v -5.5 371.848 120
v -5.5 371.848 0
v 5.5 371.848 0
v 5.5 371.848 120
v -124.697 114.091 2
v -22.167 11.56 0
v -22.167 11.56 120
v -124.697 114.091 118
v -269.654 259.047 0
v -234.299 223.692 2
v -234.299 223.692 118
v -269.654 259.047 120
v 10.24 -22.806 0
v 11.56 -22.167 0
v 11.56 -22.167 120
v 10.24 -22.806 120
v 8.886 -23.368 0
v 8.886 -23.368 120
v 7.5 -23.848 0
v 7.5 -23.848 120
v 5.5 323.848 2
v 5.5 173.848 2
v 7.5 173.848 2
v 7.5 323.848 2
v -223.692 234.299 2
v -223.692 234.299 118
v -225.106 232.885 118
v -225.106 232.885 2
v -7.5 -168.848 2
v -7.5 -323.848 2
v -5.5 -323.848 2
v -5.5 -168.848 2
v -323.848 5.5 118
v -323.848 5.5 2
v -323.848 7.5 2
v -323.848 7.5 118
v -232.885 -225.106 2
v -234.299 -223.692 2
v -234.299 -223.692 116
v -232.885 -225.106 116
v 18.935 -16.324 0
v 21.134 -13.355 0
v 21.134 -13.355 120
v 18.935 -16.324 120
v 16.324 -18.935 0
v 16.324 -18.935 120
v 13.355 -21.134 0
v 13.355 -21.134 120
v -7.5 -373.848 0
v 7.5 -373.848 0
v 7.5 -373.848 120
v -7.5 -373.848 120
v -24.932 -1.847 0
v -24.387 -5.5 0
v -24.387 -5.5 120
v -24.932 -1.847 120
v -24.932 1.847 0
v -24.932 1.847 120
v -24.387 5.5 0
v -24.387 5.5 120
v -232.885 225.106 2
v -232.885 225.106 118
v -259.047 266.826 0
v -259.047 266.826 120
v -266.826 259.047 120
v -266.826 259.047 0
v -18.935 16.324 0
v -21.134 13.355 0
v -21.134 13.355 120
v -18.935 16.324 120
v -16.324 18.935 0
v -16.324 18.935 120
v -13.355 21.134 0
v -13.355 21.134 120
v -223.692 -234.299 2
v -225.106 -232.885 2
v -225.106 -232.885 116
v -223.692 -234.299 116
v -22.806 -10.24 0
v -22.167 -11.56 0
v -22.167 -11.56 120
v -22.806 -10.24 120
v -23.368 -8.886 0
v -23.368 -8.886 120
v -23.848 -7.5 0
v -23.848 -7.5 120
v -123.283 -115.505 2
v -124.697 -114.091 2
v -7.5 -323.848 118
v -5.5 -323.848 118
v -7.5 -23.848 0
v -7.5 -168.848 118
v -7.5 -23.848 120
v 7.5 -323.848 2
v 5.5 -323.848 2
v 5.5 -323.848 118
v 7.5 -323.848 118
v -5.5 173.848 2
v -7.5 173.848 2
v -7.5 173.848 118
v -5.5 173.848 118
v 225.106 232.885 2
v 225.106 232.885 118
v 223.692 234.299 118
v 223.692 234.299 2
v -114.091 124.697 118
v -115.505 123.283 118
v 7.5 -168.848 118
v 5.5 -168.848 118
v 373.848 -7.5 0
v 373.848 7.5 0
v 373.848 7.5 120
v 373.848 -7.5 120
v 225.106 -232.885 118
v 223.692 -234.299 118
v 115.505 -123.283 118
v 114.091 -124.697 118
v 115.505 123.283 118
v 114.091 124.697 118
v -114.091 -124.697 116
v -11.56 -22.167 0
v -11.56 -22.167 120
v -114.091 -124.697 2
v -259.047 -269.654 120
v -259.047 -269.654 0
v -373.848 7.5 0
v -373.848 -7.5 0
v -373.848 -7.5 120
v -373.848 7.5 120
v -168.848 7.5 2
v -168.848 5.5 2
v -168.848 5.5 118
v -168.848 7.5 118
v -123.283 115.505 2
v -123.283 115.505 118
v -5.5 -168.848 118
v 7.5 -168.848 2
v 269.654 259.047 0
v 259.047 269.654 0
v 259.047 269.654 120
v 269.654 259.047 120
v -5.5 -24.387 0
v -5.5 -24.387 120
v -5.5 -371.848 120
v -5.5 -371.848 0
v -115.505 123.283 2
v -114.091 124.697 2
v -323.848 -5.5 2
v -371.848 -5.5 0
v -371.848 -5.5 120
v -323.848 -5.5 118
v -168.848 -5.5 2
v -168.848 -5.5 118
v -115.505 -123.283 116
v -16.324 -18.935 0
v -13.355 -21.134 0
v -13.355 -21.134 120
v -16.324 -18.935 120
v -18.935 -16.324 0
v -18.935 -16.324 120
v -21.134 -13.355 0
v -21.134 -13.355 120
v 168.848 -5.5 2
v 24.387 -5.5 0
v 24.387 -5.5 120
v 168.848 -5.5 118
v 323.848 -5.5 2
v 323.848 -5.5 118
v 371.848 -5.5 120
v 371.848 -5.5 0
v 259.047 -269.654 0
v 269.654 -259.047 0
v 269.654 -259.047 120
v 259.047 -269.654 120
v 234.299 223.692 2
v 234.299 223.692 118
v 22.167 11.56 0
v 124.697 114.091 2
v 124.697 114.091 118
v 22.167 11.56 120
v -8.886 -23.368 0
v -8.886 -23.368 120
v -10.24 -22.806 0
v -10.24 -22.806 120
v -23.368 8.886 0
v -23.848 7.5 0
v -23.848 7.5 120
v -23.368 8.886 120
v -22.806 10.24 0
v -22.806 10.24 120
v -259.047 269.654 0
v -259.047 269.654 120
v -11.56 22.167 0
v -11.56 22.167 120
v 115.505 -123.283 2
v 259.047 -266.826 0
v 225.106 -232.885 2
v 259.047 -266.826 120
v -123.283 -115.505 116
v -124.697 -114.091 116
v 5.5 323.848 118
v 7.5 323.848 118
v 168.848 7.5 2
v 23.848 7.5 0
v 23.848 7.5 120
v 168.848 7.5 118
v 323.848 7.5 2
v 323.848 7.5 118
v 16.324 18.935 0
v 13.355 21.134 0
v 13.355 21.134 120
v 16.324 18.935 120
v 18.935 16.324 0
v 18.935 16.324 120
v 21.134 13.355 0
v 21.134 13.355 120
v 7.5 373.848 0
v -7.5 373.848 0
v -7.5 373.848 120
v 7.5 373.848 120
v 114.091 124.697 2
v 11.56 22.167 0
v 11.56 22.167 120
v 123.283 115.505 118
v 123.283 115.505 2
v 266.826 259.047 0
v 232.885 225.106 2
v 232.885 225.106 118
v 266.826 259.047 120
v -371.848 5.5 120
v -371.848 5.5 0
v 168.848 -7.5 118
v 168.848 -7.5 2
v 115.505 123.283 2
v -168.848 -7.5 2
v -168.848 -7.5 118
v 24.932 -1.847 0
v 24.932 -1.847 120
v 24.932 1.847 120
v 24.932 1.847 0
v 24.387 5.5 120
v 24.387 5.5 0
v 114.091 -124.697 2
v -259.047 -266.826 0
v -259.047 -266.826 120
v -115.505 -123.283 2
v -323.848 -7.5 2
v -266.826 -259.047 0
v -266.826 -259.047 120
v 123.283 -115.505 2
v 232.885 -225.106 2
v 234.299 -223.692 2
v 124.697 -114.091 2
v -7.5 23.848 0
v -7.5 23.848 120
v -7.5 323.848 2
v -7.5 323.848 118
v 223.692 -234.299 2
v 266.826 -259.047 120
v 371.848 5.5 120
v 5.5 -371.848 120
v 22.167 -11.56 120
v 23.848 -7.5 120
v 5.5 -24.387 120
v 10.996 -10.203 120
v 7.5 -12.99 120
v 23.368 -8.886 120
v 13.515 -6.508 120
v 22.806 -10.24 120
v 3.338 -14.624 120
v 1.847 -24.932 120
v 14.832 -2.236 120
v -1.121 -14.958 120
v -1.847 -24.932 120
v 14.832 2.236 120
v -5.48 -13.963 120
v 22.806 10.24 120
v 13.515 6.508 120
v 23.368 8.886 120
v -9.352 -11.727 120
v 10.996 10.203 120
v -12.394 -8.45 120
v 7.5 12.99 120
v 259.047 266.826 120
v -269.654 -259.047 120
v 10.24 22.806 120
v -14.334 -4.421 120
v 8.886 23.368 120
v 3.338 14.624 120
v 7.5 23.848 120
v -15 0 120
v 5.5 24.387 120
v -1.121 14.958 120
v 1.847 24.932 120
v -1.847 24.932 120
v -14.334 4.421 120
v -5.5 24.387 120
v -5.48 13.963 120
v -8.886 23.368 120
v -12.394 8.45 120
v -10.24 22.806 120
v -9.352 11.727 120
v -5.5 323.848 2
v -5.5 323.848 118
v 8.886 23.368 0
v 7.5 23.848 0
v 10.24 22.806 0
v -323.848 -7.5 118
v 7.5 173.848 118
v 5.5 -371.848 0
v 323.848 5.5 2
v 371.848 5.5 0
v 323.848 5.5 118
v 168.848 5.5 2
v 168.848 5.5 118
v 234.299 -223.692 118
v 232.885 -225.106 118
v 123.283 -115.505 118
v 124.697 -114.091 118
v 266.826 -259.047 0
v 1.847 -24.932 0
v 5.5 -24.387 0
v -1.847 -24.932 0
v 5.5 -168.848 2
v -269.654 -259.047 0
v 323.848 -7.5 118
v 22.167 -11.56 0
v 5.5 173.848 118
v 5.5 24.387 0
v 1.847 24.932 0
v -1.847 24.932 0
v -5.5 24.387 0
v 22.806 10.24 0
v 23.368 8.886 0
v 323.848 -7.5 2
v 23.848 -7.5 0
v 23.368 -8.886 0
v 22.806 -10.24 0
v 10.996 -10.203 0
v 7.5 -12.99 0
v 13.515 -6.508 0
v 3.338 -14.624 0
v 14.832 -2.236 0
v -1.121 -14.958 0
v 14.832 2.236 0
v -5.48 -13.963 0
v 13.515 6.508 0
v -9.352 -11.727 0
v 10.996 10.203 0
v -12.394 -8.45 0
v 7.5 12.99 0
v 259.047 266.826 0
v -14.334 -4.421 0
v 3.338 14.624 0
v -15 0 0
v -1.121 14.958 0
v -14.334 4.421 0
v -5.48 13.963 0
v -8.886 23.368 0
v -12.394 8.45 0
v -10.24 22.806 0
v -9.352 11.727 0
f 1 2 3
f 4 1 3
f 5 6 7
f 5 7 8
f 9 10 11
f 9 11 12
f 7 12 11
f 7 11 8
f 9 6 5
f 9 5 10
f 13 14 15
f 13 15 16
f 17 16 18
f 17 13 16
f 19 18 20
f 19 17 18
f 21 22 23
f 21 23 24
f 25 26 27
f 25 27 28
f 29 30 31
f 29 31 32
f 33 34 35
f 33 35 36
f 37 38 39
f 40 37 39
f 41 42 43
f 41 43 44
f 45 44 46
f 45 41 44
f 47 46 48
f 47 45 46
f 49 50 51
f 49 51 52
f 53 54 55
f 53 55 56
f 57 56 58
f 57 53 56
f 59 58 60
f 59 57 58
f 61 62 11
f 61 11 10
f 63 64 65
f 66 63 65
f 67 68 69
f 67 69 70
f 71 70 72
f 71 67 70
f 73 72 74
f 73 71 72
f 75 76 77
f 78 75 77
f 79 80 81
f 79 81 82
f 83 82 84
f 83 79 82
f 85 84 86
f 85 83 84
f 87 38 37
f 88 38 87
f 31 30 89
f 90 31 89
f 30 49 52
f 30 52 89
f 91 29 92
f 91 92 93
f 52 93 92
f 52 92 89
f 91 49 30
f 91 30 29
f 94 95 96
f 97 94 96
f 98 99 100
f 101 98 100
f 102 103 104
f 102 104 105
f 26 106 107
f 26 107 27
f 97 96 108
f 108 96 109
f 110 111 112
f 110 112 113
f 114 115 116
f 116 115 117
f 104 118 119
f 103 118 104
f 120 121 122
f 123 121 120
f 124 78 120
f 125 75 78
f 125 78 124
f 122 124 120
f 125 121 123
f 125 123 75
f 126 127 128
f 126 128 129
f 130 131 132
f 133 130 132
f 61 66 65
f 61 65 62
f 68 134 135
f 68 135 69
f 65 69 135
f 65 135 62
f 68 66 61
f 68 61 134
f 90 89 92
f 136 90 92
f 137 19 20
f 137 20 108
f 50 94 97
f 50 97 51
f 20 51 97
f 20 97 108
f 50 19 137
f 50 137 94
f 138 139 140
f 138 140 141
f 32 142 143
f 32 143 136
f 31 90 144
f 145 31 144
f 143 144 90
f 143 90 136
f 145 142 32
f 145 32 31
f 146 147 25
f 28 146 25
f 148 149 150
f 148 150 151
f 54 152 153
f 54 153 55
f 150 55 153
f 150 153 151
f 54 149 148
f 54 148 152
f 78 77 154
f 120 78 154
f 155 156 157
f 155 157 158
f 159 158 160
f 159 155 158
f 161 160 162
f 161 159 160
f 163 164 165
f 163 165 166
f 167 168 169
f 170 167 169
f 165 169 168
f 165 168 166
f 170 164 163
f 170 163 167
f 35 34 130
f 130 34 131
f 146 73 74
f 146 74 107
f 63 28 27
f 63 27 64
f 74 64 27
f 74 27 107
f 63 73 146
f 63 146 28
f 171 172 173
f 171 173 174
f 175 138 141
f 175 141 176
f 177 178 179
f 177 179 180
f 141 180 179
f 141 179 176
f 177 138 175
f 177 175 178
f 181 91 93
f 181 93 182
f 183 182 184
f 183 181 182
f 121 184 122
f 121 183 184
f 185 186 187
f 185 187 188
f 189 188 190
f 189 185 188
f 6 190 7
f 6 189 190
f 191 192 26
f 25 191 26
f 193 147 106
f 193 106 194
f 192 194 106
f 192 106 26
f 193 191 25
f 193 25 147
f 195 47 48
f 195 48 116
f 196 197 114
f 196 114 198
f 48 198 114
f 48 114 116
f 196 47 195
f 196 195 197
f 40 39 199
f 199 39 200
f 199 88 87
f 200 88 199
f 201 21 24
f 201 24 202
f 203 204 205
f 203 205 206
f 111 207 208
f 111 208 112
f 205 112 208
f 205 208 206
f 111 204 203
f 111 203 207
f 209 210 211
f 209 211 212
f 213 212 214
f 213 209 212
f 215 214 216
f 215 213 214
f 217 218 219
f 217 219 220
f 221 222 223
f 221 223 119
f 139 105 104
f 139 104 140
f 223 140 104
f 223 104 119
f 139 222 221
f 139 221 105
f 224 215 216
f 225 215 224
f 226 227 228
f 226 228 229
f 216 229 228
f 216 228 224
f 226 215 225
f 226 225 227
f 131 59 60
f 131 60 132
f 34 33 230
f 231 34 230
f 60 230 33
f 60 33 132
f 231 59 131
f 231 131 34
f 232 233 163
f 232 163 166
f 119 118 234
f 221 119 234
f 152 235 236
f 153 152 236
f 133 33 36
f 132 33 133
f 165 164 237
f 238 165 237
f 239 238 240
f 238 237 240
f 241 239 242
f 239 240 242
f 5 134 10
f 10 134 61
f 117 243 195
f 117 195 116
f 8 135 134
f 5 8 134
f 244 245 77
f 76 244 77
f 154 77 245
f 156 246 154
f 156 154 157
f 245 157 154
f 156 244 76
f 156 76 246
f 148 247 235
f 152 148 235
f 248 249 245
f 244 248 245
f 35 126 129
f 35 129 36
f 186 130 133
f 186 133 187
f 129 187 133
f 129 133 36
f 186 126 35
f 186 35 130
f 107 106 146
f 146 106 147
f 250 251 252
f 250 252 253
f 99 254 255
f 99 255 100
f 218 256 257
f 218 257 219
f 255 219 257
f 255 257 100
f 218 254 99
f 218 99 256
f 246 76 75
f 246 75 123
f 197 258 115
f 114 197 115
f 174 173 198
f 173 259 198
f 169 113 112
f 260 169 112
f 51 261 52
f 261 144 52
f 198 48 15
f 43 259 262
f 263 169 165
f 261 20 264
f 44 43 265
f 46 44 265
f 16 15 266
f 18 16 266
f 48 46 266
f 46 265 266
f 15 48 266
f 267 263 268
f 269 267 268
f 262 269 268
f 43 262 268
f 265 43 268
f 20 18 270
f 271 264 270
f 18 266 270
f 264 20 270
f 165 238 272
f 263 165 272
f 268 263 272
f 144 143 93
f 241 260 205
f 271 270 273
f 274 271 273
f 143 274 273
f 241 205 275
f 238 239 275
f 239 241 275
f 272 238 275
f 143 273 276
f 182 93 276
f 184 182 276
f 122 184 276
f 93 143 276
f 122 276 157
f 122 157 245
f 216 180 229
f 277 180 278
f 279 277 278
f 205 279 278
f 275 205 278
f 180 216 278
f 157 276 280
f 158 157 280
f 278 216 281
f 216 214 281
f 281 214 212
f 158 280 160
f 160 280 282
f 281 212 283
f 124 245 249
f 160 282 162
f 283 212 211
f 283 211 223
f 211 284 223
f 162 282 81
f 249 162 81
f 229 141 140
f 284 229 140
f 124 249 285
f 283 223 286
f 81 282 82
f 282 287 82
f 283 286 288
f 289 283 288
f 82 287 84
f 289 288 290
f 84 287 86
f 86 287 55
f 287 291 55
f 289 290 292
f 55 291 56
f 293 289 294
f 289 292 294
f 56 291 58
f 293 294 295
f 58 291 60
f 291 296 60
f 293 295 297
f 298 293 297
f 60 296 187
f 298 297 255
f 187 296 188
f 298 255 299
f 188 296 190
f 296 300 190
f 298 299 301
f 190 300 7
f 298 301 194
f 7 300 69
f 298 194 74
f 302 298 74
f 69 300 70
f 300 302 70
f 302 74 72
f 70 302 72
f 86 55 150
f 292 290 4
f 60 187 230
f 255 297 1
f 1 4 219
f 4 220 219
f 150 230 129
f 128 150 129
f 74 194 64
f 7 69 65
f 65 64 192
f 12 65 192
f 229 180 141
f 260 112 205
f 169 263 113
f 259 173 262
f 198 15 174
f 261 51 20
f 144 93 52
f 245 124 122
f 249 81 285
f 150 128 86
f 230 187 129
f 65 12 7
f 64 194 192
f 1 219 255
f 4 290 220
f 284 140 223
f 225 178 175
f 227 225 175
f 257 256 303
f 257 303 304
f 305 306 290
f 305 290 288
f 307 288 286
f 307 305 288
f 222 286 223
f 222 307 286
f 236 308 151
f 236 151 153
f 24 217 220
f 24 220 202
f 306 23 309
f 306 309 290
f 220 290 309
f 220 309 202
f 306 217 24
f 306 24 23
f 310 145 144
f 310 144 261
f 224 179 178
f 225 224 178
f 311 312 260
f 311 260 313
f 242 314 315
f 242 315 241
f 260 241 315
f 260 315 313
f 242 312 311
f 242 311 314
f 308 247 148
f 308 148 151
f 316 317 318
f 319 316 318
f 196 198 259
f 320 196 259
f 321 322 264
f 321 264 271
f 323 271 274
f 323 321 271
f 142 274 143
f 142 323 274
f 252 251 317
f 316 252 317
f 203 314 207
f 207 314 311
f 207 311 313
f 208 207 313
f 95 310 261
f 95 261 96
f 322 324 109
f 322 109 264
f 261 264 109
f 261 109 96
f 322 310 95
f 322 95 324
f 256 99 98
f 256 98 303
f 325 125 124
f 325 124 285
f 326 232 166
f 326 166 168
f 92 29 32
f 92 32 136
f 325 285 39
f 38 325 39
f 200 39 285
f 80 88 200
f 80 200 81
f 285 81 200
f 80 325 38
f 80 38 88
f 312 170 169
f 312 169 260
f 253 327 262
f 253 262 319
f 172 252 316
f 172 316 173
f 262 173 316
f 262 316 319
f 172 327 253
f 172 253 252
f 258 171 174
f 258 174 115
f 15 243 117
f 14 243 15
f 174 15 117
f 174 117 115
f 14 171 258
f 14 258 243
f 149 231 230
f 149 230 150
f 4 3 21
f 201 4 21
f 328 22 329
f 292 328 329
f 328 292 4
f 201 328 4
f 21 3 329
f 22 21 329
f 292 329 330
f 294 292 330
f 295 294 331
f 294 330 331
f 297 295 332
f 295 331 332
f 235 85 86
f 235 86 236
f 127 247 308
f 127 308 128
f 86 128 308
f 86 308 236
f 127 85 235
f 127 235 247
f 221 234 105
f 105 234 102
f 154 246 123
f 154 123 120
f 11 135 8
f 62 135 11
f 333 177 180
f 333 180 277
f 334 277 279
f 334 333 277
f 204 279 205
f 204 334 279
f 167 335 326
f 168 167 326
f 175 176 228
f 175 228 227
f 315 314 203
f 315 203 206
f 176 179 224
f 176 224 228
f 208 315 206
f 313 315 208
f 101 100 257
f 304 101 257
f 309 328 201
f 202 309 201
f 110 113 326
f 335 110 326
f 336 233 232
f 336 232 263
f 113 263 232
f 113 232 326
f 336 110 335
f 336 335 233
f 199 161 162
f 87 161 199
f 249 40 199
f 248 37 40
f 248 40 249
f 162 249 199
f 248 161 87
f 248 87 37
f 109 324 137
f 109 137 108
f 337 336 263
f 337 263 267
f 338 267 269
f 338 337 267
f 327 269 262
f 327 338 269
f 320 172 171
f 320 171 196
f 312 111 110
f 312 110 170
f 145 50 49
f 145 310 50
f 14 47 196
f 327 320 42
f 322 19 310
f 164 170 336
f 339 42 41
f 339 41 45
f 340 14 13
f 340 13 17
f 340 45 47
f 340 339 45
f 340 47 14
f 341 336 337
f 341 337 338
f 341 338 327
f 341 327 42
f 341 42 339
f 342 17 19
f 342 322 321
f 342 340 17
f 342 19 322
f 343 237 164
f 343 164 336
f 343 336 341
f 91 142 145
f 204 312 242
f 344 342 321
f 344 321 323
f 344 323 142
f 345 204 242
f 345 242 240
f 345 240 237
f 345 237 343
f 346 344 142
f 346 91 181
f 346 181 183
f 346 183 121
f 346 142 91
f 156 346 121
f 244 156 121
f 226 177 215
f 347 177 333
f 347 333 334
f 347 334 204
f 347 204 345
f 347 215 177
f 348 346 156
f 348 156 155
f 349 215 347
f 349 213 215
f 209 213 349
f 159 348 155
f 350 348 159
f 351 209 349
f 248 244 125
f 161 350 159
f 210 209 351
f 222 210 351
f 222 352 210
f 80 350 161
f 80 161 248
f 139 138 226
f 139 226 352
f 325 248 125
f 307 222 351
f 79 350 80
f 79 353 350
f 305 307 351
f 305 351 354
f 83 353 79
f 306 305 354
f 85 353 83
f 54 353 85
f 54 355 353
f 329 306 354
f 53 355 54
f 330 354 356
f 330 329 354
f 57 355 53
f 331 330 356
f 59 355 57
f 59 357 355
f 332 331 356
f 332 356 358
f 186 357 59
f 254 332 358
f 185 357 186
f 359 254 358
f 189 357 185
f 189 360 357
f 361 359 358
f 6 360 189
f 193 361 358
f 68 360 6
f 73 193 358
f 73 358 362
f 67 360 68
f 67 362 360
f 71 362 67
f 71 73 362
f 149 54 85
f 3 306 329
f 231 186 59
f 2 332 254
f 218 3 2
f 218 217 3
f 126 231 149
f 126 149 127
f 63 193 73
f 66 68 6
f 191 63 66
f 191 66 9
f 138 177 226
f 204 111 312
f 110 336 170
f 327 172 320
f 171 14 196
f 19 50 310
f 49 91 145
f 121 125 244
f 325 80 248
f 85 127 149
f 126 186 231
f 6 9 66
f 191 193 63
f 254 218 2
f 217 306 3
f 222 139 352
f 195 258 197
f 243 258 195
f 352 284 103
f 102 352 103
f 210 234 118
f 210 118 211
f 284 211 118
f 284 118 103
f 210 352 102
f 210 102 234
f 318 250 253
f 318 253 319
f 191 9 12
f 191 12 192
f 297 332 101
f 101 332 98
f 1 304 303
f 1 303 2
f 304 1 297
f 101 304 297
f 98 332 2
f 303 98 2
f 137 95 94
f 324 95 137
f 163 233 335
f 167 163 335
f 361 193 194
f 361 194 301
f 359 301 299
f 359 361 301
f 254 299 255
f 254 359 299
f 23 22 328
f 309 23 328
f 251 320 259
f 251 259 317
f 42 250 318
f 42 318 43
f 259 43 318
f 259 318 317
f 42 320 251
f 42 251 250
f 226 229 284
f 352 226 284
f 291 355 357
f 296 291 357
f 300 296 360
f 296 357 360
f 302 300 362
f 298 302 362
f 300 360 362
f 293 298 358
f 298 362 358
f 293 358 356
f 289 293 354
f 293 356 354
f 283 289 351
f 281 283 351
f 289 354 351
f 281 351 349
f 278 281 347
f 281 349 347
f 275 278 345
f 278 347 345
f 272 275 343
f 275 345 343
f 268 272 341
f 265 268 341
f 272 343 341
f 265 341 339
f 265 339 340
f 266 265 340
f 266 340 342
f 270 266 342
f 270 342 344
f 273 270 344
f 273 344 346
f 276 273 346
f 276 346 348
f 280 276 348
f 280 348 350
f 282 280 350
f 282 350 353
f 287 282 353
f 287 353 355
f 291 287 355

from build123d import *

# Parameters (mm, degrees)
SKETCH1_R           = 25
BOSS_EXTRUDE1_DEPTH = 120
BOSS_EXTRUDE3_DEPTH = 120
SKETCH5_W           = 116
SKETCH5_H           = 155
CUT_EXTRUDE1_DEPTH  = 20
SKETCH6_W           = 116
SKETCH6_H           = 150
CUT_EXTRUDE2_DEPTH  = 20
SKETCH7_W           = 116
SKETCH7_H           = 155
CUT_EXTRUDE3_DEPTH  = 20
SKETCH8_W           = 155
SKETCH8_H           = 116
CUT_EXTRUDE4_DEPTH  = 20
SKETCH9_W           = 114
SKETCH9_H           = 155
CUT_EXTRUDE5_DEPTH  = 20
SKETCH10_W          = 155
SKETCH10_H          = 116
CUT_EXTRUDE6_DEPTH  = 20
SKETCH12_W          = 116
SKETCH12_H          = 155
CUT_EXTRUDE7_DEPTH  = 20
SKETCH13_W          = 116
SKETCH13_H          = 155
CUT_EXTRUDE8_DEPTH  = 20
SKETCH14_R          = 15
CUT_EXTRUDE11_DEPTH = 543.148846766


with BuildPart() as part:
    # Sketch1 → Boss-Extrude1 (new body)
    with BuildSketch(Plane.XY):
        Circle(SKETCH1_R)
    extrude(amount=BOSS_EXTRUDE1_DEPTH)

    # Sketch2 → Boss-Extrude3 (add)
    with BuildSketch(Plane.XY):
        with BuildLine():
            Line((11.560121095, 22.166722813), (259.04749451, 269.654096228))
            Line((259.04749451, 269.654096228), (269.654096228, 259.04749451))
            Line((269.654096228, 259.04749451), (22.166722813, 11.560121095))
            ThreePointArc((22.166722813, 11.560121095), (23.096988313, 9.567085809), (23.848480035, 7.5))
            Line((23.848480035, 7.5), (373.848480035, 7.5))
            Line((373.848480035, 7.5), (373.848480035, -7.5))
            Line((373.848480035, -7.5), (23.848480035, -7.5))
            ThreePointArc((23.848480035, -7.5), (23.096988313, -9.567085809), (22.166722813, -11.560121095))
            Line((22.166722813, -11.560121095), (269.654096228, -259.04749451))
            Line((269.654096228, -259.04749451), (259.04749451, -269.654096228))
            Line((259.04749451, -269.654096228), (11.560121095, -22.166722813))
            ThreePointArc((11.560121095, -22.166722813), (9.567085809, -23.096988313), (7.5, -23.848480035))
            Line((7.5, -23.848480035), (7.5, -373.848480035))
            Line((7.5, -373.848480035), (-7.5, -373.848480035))
            Line((-7.5, -373.848480035), (-7.5, -23.848480035))
            ThreePointArc((-7.5, -23.848480035), (-9.567085809, -23.096988313), (-11.560121095, -22.166722813))
            Line((-11.560121095, -22.166722813), (-259.04749451, -269.654096228))
            Line((-259.04749451, -269.654096228), (-269.654096228, -259.04749451))
            Line((-269.654096228, -259.04749451), (-22.166722813, -11.560121095))
            ThreePointArc((-22.166722813, -11.560121095), (-23.096988313, -9.567085809), (-23.848480035, -7.5))
            Line((-23.848480035, -7.5), (-373.848480035, -7.5))
            Line((-373.848480035, -7.5), (-373.848480035, 7.5))
            Line((-373.848480035, 7.5), (-23.848480035, 7.5))
            ThreePointArc((-23.848480035, 7.5), (-23.096988313, 9.567085809), (-22.166722813, 11.560121095))
            Line((-22.166722813, 11.560121095), (-269.654096228, 259.04749451))
            Line((-269.654096228, 259.04749451), (-259.04749451, 269.654096228))
            Line((-259.04749451, 269.654096228), (-11.560121095, 22.166722813))
            ThreePointArc((-11.560121095, 22.166722813), (-9.567085809, 23.096988313), (-7.5, 23.848480035))
            Line((-7.5, 23.848480035), (-7.5, 373.848480035))
            Line((-7.5, 373.848480035), (7.5, 373.848480035))
            Line((7.5, 373.848480035), (7.5, 23.848480035))
            ThreePointArc((7.5, 23.848480035), (9.567085809, 23.096988313), (11.560121095, 22.166722813))
        make_face()
        with BuildLine():
            Line((259.04749451, 266.825669103), (13.355477064, 21.133651658))
            ThreePointArc((13.355477064, 21.133651658), (17.67766953, 17.67766953), (21.133651658, 13.355477064))
            Line((21.133651658, 13.355477064), (266.825669103, 259.04749451))
            Line((266.825669103, 259.04749451), (259.04749451, 266.825669103))
        make_face(mode=Mode.SUBTRACT)
        with BuildLine():
            Line((-5.5, 371.848480035), (5.5, 371.848480035))
            Line((5.5, 371.848480035), (5.5, 24.387496797))
            ThreePointArc((5.5, 24.387496797), (0, 25), (-5.5, 24.387496797))
            Line((-5.5, 24.387496797), (-5.5, 371.848480035))
        make_face(mode=Mode.SUBTRACT)
        with BuildLine():
            Line((371.848480035, 5.5), (24.387496797, 5.5))
            ThreePointArc((24.387496797, 5.5), (25, 0), (24.387496797, -5.5))
            Line((24.387496797, -5.5), (371.848480035, -5.5))
            Line((371.848480035, -5.5), (371.848480035, 5.5))
        make_face(mode=Mode.SUBTRACT)
        with BuildLine():
            Line((266.825669103, -259.04749451), (21.133651658, -13.355477064))
            ThreePointArc((21.133651658, -13.355477064), (17.67766953, -17.67766953), (13.355477064, -21.133651658))
            Line((13.355477064, -21.133651658), (259.04749451, -266.825669103))
            Line((259.04749451, -266.825669103), (266.825669103, -259.04749451))
        make_face(mode=Mode.SUBTRACT)
        with BuildLine():
            Line((5.5, -371.848480035), (5.5, -24.387496797))
            ThreePointArc((5.5, -24.387496797), (0, -25), (-5.5, -24.387496797))
            Line((-5.5, -24.387496797), (-5.5, -371.848480035))
            Line((-5.5, -371.848480035), (5.5, -371.848480035))
        make_face(mode=Mode.SUBTRACT)
        with BuildLine():
            Line((-259.04749451, -266.825669103), (-13.355477064, -21.133651658))
            ThreePointArc((-13.355477064, -21.133651658), (-17.67766953, -17.67766953), (-21.133651658, -13.355477064))
            Line((-21.133651658, -13.355477064), (-266.825669103, -259.04749451))
            Line((-266.825669103, -259.04749451), (-259.04749451, -266.825669103))
        make_face(mode=Mode.SUBTRACT)
        with BuildLine():
            Line((-371.848480035, -5.5), (-24.387496797, -5.5))
            ThreePointArc((-24.387496797, -5.5), (-25, 0), (-24.387496797, 5.5))
            Line((-24.387496797, 5.5), (-371.848480035, 5.5))
            Line((-371.848480035, 5.5), (-371.848480035, -5.5))
        make_face(mode=Mode.SUBTRACT)
        with BuildLine():
            Line((-266.825669103, 259.04749451), (-21.133651658, 13.355477064))
            ThreePointArc((-21.133651658, 13.355477064), (-17.67766953, 17.67766953), (-13.355477064, 21.133651658))
            Line((-13.355477064, 21.133651658), (-259.04749451, 266.825669103))
            Line((-259.04749451, 266.825669103), (-266.825669103, 259.04749451))
        make_face(mode=Mode.SUBTRACT)
    extrude(amount=BOSS_EXTRUDE3_DEPTH)

    # Sketch5 → Cut-Extrude1 (cut)
    with BuildSketch(Plane(origin=(5.303300859, 5.303300859, 0), x_dir=(0, 0, -1), z_dir=(0.7071067811865304, 0.7071067811865648, 0))):
        with Locations((-60, 246.348480035)):
            Rectangle(SKETCH5_W, SKETCH5_H)
    extrude(amount=-CUT_EXTRUDE1_DEPTH, mode=Mode.SUBTRACT)

    # Sketch6 → Cut-Extrude2 (cut)
    with BuildSketch(Plane.ZY.offset(7.5)):
        with Locations((60, 248.848480035)):
            Rectangle(SKETCH6_W, SKETCH6_H)
    extrude(amount=-CUT_EXTRUDE2_DEPTH, mode=Mode.SUBTRACT)

    # Sketch7 → Cut-Extrude3 (cut)
    with BuildSketch(Plane(origin=(5.303300859, -5.303300859, 0), x_dir=(0, 0, -1), z_dir=(0.7071067811865477, -0.7071067811865475, 0))):
        with Locations((-60, 246.348480035)):
            Rectangle(SKETCH7_W, SKETCH7_H)
    extrude(amount=-CUT_EXTRUDE3_DEPTH, mode=Mode.SUBTRACT)

    # Sketch8 → Cut-Extrude4 (cut)
    with BuildSketch(Plane.XZ.offset(7.5)):
        with Locations((-246.348480035, 60)):
            Rectangle(SKETCH8_W, SKETCH8_H)
    extrude(amount=-CUT_EXTRUDE4_DEPTH, mode=Mode.SUBTRACT)

    # Sketch9 → Cut-Extrude5 (cut)
    with BuildSketch(Plane(origin=(-5.303300859, 5.303300859, 0), x_dir=(0, 0, 1), z_dir=(-0.7071067811865476, 0.7071067811865476, 0))):
        with Locations((59, -246.348480035)):
            Rectangle(SKETCH9_W, SKETCH9_H)
    extrude(amount=-CUT_EXTRUDE5_DEPTH, mode=Mode.SUBTRACT)

    # Sketch10 → Cut-Extrude6 (cut)
    with BuildSketch(Plane.XZ.offset(7.5)):
        with Locations((246.348480035, 60)):
            Rectangle(SKETCH10_W, SKETCH10_H)
    extrude(amount=-CUT_EXTRUDE6_DEPTH, mode=Mode.SUBTRACT)

    # Sketch12 → Cut-Extrude7 (cut)
    with BuildSketch(Plane.ZY.offset(7.5)):
        with Locations((60, -246.348480035)):
            Rectangle(SKETCH12_W, SKETCH12_H)
    extrude(amount=-CUT_EXTRUDE7_DEPTH, mode=Mode.SUBTRACT)

    # Sketch13 → Cut-Extrude8 (cut)
    with BuildSketch(Plane(origin=(-5.303300859, -5.303300859, 0), x_dir=(0, 0, 1), z_dir=(-0.7071067811865477, -0.7071067811865475, 0))):
        with Locations((60, -246.348480035)):
            Rectangle(SKETCH13_W, SKETCH13_H)
    extrude(amount=-CUT_EXTRUDE8_DEPTH, mode=Mode.SUBTRACT)

    # Sketch14 → Cut-Extrude11 (cut, through all)
    with BuildSketch(Plane(origin=(0, 0, 0), x_dir=(-1, 0, 0), z_dir=(0, 0, -1))):
        Circle(SKETCH14_R)
    extrude(amount=-CUT_EXTRUDE11_DEPTH, mode=Mode.SUBTRACT)


solid = part.part
